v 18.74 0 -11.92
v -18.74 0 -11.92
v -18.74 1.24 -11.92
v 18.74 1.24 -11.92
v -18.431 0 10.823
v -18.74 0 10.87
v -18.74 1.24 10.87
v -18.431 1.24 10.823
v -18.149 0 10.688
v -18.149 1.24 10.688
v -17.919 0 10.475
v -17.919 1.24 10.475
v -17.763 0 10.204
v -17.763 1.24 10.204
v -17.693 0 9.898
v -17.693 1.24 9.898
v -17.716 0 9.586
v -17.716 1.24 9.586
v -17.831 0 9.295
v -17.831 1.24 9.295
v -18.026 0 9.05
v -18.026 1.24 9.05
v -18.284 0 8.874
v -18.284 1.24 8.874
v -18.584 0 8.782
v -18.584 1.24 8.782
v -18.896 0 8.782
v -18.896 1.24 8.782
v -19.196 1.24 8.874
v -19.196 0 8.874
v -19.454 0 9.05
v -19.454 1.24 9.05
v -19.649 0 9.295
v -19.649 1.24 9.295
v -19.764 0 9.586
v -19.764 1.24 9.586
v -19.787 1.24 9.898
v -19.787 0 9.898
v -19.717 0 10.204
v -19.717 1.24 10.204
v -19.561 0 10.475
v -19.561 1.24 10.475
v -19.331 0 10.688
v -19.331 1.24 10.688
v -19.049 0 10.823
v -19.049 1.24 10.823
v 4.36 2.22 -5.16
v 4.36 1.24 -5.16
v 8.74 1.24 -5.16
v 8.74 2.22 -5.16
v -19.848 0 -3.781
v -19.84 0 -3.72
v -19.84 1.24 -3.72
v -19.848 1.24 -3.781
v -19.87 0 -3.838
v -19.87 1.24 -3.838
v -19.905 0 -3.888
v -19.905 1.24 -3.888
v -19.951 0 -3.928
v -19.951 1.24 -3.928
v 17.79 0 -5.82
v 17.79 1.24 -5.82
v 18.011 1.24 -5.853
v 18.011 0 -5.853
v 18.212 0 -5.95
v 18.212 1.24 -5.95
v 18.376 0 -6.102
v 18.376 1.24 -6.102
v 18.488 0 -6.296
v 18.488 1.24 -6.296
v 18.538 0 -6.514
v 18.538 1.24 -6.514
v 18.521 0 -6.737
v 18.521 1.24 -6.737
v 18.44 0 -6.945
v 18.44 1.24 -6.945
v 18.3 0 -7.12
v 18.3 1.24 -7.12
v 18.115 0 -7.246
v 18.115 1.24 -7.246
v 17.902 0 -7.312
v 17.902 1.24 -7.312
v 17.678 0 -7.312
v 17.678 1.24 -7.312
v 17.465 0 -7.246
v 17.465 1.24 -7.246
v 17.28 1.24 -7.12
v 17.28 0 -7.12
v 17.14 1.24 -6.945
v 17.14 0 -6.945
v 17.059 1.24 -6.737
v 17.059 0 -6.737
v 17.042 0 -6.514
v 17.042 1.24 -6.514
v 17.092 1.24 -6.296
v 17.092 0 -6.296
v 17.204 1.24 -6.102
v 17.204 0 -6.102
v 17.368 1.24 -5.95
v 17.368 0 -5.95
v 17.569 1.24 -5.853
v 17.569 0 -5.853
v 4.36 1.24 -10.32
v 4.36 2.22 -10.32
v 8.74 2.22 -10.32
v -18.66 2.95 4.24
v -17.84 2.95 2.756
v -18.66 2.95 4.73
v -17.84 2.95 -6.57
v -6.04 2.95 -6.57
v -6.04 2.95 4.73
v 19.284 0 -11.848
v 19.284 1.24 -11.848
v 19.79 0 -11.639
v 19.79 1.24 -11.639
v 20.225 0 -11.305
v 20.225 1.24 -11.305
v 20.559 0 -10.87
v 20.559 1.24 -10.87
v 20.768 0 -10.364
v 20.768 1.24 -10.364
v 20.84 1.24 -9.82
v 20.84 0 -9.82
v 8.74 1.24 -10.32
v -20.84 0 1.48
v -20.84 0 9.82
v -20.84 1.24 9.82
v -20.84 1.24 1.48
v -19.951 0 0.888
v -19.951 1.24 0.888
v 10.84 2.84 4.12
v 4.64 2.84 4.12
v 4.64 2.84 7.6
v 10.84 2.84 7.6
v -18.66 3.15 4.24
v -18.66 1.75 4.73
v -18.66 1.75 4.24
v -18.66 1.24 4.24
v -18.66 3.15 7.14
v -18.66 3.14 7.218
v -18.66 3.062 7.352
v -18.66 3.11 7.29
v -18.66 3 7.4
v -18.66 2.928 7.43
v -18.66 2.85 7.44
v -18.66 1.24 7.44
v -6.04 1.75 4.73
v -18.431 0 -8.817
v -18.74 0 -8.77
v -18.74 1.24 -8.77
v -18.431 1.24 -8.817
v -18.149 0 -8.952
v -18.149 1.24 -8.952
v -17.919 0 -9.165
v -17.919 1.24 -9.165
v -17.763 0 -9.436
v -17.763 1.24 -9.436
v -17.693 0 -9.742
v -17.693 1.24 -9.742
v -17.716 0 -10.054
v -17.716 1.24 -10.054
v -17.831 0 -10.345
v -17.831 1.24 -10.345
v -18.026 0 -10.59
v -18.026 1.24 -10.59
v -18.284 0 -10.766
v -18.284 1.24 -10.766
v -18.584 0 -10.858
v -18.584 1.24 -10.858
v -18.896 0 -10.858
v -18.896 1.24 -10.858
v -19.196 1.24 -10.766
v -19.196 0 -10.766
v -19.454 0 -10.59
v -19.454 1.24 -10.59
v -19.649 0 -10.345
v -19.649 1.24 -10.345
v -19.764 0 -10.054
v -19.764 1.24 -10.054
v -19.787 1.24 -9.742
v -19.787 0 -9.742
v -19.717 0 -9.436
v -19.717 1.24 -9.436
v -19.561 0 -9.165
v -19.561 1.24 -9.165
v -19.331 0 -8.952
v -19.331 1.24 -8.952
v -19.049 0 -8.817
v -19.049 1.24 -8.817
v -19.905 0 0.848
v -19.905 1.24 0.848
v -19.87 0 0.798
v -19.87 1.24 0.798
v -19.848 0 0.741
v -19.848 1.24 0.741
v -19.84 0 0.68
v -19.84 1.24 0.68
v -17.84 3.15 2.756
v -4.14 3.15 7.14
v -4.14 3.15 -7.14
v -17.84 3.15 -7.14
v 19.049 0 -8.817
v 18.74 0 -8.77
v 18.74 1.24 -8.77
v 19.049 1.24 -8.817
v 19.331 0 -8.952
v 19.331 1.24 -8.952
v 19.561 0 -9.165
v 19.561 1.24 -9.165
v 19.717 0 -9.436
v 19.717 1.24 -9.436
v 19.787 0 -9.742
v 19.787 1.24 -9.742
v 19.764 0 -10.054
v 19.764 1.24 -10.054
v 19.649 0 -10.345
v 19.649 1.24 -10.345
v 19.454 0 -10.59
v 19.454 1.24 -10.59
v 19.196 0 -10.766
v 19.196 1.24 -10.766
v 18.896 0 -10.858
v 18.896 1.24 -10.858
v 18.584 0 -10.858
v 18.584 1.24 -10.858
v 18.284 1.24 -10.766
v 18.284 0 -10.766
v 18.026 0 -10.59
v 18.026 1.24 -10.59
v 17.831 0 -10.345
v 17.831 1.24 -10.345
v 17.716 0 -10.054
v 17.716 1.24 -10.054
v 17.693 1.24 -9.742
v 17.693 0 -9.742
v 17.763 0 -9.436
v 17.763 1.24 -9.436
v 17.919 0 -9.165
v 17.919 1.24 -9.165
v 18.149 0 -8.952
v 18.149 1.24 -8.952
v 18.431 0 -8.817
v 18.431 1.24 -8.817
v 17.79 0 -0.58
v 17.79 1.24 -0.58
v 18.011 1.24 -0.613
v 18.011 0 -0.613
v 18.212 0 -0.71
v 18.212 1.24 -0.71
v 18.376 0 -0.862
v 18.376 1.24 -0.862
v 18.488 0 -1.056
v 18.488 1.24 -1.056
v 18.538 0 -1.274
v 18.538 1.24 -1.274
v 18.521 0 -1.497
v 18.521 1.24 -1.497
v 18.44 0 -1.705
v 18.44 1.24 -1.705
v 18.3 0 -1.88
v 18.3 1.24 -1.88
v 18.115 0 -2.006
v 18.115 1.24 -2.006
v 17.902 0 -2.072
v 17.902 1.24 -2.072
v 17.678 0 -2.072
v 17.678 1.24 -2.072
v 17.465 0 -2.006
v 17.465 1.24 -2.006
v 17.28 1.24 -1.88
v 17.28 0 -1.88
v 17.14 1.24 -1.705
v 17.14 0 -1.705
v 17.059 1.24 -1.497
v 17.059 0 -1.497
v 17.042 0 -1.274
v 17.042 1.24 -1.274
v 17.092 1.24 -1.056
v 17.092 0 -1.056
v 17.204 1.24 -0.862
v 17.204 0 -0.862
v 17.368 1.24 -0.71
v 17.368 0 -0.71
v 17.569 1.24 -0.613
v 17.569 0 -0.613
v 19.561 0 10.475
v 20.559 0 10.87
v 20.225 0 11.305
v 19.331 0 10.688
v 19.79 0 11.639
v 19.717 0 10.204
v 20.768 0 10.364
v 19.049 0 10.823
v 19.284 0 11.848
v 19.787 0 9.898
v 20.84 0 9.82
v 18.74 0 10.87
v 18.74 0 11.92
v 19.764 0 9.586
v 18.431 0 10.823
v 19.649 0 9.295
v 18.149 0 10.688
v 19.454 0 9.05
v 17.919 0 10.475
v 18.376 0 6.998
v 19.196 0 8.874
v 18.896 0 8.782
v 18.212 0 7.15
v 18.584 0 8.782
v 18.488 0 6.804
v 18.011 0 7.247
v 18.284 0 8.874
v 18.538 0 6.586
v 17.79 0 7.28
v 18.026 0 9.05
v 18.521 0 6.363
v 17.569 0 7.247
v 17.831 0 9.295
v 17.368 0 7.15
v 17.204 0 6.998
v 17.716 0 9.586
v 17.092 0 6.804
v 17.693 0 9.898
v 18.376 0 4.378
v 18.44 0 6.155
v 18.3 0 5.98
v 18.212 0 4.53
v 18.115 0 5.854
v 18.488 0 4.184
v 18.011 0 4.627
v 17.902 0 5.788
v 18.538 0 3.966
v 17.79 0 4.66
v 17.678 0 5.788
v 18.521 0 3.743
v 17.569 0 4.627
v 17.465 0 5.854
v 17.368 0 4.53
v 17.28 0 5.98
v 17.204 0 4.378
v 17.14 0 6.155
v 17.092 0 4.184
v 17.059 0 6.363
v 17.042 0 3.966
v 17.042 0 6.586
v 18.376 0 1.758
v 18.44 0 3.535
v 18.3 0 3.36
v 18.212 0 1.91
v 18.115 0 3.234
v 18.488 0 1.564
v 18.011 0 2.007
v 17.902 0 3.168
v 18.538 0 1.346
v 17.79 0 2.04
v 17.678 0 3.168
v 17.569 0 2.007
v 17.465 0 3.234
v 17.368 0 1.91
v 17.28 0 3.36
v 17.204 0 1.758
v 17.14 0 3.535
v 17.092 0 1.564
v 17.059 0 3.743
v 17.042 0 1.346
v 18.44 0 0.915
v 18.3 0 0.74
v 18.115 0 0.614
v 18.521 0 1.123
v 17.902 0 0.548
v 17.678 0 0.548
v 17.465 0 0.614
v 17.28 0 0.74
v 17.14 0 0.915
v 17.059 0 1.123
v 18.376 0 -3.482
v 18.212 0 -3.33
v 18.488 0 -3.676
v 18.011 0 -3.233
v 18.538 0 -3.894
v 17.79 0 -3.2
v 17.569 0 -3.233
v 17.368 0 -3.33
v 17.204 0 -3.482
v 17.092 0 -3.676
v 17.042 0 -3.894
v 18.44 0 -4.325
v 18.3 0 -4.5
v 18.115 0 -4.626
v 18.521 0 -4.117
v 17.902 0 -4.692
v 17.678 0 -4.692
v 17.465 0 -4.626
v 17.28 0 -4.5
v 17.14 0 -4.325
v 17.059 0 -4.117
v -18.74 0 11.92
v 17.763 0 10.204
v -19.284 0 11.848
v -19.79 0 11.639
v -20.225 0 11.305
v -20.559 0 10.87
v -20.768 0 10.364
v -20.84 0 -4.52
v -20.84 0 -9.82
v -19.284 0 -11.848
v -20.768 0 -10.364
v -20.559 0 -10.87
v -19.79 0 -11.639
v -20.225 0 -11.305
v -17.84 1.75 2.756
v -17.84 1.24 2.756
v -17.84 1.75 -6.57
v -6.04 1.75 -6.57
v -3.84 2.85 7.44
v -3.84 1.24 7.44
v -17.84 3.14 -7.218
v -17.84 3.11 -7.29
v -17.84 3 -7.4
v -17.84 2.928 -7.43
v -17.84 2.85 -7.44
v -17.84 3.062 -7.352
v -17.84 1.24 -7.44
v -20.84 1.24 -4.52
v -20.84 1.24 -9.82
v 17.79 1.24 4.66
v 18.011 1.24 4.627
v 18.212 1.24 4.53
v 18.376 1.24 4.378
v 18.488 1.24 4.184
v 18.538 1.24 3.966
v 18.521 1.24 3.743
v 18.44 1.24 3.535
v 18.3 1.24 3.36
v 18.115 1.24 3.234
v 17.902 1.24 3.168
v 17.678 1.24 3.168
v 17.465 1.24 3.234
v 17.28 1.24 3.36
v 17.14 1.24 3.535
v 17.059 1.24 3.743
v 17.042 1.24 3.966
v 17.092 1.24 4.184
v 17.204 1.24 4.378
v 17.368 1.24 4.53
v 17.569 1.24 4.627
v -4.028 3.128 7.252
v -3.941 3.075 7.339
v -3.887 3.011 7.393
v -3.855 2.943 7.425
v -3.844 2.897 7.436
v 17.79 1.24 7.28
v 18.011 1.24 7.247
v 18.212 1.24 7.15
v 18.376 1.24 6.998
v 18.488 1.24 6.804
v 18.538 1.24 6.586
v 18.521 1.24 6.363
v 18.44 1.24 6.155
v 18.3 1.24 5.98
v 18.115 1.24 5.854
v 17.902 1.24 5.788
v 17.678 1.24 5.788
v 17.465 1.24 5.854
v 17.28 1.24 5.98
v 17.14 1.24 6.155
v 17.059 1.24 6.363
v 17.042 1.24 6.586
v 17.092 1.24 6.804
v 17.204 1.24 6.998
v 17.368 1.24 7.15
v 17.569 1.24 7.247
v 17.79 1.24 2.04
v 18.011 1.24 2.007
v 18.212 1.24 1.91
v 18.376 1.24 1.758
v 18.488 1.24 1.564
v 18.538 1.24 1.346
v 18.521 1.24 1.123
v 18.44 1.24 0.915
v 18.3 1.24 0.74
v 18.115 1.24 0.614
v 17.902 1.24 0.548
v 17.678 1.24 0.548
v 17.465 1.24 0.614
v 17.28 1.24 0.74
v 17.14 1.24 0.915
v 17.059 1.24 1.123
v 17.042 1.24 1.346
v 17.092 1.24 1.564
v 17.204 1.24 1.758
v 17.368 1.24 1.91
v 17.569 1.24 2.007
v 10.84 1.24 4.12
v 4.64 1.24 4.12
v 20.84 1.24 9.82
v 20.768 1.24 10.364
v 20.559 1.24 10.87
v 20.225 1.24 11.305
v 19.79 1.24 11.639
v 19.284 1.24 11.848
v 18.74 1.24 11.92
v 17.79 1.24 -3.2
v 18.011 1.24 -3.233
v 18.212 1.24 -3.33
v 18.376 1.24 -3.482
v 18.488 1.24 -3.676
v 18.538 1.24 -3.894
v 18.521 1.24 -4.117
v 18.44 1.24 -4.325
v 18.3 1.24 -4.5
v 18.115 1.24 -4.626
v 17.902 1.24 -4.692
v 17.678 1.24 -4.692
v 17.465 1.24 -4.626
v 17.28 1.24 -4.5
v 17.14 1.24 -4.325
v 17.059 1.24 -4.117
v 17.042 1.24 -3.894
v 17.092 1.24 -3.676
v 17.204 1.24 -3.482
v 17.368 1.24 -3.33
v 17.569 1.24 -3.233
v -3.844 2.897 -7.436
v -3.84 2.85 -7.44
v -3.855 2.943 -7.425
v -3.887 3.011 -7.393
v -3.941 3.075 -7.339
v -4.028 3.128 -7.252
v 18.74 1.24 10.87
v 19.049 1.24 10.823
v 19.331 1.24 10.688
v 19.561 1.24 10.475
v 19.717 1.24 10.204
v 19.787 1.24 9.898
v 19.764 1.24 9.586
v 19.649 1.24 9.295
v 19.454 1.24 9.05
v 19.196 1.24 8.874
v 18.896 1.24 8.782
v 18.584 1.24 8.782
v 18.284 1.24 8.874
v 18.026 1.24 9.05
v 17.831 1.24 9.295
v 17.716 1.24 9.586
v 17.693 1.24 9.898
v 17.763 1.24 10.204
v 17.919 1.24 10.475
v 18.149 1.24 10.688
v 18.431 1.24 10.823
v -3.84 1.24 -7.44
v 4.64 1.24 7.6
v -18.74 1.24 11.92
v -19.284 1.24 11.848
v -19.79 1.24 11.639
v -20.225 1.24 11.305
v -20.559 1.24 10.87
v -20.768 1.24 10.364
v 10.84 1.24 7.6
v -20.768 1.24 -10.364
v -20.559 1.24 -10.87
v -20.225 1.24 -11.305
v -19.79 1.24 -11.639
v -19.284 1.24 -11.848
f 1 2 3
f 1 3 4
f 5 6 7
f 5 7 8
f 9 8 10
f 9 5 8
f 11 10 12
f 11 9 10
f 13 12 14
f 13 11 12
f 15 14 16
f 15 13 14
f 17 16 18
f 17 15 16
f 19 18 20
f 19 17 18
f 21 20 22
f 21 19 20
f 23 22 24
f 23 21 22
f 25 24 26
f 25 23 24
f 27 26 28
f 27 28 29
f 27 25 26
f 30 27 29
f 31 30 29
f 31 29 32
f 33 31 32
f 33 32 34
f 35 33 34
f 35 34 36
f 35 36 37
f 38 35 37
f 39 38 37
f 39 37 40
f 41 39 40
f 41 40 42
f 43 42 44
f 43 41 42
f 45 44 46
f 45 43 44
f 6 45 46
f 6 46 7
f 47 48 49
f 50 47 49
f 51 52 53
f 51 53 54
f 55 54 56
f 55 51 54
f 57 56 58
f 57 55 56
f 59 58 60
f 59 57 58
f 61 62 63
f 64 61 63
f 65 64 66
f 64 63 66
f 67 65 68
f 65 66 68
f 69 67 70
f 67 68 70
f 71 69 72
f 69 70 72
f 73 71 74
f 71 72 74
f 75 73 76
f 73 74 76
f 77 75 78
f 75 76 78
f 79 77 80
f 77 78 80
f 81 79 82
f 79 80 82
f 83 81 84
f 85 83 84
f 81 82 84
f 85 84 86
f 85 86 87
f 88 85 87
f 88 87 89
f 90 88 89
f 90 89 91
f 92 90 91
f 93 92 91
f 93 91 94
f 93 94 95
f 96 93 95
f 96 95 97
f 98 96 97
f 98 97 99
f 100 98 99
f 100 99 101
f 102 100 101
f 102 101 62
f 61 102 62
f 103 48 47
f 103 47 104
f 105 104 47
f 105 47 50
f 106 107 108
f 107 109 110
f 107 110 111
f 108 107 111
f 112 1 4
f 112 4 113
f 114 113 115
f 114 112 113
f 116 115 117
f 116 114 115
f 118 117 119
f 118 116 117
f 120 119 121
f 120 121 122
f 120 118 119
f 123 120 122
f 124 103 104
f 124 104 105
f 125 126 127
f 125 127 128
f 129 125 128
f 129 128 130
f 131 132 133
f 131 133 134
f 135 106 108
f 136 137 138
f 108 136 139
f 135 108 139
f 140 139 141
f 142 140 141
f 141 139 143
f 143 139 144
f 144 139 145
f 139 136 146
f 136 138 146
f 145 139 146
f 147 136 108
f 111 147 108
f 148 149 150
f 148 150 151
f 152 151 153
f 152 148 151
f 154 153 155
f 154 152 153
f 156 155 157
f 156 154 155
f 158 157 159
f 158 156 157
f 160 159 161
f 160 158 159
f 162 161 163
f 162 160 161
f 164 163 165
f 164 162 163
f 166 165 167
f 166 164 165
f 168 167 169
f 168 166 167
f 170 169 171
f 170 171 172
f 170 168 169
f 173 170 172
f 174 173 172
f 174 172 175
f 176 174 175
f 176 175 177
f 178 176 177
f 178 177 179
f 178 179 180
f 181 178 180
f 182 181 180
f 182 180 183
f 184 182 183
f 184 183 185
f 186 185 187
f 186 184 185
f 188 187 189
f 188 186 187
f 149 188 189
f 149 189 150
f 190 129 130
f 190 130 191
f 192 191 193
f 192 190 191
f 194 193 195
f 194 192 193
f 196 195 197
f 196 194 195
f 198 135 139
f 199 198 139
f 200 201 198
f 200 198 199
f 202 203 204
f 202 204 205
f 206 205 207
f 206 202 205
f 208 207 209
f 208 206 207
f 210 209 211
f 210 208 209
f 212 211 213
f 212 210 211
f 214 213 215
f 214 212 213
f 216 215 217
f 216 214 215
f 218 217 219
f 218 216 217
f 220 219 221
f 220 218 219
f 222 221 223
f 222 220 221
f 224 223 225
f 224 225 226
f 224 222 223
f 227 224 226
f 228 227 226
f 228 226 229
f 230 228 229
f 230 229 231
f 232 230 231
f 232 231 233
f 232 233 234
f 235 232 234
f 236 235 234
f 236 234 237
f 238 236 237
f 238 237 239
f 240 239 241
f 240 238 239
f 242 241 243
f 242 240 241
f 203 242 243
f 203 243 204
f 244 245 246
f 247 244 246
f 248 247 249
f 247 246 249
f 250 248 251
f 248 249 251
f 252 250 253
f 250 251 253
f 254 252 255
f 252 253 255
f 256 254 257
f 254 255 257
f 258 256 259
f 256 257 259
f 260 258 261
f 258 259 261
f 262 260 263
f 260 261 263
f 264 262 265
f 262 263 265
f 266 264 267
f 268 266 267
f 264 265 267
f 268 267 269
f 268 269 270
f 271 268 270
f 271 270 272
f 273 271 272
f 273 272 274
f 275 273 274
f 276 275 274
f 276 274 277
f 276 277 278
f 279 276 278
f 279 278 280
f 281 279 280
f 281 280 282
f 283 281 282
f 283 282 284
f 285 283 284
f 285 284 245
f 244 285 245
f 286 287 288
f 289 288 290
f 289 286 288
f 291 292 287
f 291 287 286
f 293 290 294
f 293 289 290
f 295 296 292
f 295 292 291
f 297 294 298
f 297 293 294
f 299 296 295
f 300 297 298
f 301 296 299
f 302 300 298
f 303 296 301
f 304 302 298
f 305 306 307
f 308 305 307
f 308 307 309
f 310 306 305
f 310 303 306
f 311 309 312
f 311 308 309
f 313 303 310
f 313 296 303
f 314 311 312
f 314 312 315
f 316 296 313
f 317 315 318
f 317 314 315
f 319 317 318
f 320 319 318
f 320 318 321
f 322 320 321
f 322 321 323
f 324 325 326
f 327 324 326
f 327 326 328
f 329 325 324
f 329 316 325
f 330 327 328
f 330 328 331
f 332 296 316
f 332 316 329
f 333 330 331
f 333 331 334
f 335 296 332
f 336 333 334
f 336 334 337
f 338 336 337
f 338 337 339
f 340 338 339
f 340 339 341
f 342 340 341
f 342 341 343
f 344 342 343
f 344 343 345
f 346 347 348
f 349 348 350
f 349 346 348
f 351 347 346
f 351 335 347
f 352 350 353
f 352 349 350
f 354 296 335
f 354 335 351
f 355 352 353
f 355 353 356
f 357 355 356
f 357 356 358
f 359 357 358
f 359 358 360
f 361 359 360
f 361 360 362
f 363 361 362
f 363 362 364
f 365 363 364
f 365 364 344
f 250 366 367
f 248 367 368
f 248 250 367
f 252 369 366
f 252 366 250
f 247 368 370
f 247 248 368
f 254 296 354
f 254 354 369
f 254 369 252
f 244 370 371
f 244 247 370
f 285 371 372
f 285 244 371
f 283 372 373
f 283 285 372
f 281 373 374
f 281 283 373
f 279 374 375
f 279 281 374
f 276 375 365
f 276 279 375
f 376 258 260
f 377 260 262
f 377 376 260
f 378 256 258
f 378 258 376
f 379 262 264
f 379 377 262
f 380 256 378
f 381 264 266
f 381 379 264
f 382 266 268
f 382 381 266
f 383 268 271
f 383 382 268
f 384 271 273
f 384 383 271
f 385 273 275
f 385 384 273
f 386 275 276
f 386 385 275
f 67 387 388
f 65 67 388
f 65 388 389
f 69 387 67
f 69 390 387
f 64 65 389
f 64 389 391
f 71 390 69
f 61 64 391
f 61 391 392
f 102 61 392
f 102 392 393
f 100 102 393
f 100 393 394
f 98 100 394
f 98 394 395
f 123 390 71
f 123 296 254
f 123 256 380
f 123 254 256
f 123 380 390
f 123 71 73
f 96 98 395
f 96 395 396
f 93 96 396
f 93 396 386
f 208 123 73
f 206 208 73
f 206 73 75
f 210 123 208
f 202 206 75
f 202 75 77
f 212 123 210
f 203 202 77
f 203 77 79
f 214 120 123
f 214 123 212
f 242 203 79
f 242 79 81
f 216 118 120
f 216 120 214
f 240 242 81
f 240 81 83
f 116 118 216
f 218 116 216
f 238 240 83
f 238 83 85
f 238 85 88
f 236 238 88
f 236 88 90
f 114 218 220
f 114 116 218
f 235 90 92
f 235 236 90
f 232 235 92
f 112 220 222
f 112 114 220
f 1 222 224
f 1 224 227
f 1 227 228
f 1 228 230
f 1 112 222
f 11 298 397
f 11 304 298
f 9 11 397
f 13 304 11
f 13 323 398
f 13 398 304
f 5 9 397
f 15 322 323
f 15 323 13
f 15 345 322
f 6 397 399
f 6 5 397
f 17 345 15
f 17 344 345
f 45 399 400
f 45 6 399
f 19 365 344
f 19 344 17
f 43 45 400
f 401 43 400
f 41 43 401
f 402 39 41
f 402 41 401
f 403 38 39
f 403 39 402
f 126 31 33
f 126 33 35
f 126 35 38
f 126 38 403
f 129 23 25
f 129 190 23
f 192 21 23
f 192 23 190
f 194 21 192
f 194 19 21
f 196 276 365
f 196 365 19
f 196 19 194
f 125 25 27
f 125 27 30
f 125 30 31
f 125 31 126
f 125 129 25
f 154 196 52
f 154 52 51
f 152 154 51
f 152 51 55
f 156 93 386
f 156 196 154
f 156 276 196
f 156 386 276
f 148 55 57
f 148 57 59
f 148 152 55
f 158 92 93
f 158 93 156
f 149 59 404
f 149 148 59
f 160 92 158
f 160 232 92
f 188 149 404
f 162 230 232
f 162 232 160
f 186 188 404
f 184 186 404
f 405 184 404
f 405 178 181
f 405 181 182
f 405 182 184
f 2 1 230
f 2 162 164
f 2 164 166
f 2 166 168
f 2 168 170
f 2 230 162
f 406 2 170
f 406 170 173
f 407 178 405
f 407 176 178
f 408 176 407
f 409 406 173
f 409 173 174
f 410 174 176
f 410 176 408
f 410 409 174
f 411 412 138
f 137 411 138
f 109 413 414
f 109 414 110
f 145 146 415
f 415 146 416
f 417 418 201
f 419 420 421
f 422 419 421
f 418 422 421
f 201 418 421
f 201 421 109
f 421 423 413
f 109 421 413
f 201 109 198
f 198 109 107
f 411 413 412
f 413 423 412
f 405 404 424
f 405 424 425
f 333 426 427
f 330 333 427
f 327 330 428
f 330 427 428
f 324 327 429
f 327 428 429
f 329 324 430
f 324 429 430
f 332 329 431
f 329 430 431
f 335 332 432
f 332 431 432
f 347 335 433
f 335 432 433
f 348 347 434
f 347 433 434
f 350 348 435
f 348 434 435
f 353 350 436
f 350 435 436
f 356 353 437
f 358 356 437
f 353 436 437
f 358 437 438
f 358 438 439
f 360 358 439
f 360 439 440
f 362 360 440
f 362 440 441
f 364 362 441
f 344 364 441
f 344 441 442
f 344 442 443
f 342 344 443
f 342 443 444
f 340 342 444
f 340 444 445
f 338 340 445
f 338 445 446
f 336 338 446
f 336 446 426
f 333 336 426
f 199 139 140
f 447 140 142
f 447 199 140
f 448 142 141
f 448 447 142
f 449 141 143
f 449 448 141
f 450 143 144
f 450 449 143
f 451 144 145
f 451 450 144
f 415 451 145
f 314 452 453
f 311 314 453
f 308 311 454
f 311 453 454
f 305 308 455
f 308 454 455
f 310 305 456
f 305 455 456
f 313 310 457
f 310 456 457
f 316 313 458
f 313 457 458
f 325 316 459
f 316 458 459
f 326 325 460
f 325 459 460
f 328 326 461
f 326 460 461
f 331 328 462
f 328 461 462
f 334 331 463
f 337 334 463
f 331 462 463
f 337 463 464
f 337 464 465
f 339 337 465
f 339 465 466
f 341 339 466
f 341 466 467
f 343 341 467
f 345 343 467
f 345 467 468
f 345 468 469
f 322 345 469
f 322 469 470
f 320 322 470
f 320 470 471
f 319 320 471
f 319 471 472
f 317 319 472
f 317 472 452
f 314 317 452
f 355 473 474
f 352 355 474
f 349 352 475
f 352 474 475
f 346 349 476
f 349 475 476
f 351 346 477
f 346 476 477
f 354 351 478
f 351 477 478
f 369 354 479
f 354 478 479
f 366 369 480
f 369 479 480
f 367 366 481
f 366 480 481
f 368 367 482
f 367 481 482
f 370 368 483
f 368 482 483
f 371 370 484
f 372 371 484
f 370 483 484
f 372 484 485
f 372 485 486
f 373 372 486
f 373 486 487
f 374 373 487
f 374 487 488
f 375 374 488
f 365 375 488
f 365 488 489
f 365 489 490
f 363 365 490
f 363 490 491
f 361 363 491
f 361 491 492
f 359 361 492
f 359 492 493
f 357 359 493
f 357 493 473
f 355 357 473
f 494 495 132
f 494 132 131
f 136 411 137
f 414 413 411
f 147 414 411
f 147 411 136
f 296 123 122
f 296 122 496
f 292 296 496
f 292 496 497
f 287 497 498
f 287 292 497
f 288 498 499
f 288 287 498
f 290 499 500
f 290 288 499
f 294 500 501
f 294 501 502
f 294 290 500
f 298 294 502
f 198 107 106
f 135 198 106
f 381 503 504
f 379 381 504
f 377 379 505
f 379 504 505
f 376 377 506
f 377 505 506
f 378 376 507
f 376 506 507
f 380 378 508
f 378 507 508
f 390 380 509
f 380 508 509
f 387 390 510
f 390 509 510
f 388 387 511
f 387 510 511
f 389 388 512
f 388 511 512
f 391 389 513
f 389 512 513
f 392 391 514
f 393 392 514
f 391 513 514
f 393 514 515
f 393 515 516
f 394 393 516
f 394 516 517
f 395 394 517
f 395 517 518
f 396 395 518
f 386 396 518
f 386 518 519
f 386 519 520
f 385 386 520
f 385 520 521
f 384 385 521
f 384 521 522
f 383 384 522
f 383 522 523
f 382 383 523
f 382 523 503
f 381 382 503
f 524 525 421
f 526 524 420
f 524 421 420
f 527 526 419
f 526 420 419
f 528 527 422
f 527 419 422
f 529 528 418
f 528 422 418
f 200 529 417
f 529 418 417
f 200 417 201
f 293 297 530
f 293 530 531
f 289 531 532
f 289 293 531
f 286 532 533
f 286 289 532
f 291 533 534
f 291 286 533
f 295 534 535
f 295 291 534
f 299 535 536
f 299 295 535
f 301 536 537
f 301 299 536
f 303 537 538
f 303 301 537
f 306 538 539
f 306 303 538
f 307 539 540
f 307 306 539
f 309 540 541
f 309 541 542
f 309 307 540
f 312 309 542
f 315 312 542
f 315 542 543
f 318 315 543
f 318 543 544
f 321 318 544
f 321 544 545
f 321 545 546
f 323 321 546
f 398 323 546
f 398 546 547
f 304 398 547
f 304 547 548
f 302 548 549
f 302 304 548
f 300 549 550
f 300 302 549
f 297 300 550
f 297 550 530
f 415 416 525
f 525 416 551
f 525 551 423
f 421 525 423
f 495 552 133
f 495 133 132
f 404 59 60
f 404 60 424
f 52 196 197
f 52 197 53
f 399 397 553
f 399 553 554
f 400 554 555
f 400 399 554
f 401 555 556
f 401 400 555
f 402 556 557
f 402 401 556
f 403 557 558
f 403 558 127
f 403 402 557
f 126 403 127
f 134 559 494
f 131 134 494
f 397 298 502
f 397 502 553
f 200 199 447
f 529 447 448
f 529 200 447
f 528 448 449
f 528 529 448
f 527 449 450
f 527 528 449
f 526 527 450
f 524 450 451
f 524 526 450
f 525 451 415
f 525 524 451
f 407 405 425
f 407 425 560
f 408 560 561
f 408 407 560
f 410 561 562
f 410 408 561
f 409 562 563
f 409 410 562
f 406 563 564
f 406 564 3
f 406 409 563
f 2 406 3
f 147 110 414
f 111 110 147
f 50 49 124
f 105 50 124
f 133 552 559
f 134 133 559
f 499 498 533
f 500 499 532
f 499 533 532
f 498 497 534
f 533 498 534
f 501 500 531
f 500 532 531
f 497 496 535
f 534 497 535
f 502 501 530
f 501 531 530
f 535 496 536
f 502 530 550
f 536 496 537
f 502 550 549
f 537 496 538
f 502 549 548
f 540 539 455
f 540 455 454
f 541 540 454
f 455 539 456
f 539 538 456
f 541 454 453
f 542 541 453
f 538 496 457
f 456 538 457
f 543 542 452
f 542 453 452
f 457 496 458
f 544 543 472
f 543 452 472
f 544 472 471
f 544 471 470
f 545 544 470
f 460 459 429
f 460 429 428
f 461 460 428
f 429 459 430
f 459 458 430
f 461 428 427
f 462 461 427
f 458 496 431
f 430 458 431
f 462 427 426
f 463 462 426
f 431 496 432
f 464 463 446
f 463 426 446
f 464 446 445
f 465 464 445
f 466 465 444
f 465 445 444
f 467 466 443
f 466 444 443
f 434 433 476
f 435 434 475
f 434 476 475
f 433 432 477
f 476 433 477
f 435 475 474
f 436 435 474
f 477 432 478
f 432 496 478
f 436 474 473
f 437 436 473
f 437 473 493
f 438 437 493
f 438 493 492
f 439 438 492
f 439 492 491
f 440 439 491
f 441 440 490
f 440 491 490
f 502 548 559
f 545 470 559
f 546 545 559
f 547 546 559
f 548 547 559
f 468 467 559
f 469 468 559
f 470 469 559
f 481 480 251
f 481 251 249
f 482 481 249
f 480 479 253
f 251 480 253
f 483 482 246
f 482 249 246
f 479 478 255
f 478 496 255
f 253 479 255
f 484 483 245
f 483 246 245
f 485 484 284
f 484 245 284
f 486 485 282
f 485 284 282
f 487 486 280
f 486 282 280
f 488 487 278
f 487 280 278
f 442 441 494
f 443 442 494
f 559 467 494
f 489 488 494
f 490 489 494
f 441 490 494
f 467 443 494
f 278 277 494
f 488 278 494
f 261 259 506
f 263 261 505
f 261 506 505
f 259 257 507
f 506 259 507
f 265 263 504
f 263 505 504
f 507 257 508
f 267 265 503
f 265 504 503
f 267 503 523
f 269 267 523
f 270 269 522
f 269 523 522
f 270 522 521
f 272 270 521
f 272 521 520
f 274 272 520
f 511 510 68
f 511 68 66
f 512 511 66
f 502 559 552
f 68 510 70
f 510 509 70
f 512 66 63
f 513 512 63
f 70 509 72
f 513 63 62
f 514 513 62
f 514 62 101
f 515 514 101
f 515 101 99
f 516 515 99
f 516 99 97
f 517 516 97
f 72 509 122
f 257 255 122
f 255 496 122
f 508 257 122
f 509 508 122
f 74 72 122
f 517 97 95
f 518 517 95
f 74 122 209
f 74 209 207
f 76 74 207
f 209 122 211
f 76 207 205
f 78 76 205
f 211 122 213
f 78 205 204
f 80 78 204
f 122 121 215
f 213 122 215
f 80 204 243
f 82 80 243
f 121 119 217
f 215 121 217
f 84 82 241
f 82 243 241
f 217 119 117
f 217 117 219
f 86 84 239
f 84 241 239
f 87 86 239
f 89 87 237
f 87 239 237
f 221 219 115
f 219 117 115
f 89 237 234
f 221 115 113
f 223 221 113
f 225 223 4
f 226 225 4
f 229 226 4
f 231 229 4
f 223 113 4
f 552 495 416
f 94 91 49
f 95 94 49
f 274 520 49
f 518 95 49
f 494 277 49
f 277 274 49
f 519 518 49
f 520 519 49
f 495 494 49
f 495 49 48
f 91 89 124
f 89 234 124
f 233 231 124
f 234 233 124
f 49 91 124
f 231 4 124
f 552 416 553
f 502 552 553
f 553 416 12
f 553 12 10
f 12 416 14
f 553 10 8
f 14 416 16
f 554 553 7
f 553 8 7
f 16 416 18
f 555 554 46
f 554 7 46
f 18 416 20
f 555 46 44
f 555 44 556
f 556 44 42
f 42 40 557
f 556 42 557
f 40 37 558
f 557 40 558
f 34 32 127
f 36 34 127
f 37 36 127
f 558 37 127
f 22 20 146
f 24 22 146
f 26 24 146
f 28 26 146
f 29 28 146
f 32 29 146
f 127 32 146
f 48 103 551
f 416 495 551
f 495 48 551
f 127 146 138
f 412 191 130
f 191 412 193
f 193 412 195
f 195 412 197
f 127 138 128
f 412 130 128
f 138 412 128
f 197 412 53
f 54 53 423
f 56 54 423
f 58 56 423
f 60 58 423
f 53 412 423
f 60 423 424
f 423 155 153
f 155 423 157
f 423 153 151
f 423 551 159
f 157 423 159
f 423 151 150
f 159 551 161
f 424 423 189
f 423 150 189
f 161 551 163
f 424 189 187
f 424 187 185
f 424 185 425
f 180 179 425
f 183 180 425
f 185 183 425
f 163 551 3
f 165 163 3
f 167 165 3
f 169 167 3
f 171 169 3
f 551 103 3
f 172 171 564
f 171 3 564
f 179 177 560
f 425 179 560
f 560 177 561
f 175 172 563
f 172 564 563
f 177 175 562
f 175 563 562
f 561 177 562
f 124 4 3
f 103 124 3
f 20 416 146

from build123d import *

# Parameters (mm, degrees)
ESQUISSE1_R                         = 1.05
PLAQUE_DEPTH                        = 1.24
CARTE_SD_DEPTH                      = 1.91
ESQUISSE4_W                         = 6.2
ESQUISSE4_H                         = 3.48
PUCE_DEPTH                          = 1.6
ESQUISSE7_W                         = 4.38
ESQUISSE7_H                         = 5.16
PUCE_2_DEPTH                        = 0.98
ESQUISSE8_R                         = 0.75
ENL_V_MAT_EXTRU_1_DEPTH             = 25.084021674
ESQUISSE9_W                         = 11.3
ESQUISSE9_H                         = 1.2
ENL_V_MAT_EXTRU_3_DEPTH             = 11.8
ENL_V_MAT_EXTRU_3_DIRECTION_2_REACH = 42.597
CONG_1_R                            = 0.3


with BuildPart() as part:
    # Esquisse1 → Plaque (new body)
    with BuildSketch(Plane(origin=(0, 0, 0), x_dir=(1, 0, 0), z_dir=(0, 1, 0))):
        with BuildLine():
            Line((-18.74, 11.92), (18.74, 11.92))
            ThreePointArc((18.74, 11.92), (20.22492424, 11.30492424), (20.84, 9.82))
            Line((20.84, 9.82), (20.84, -9.82))
            ThreePointArc((20.84, -9.82), (20.22492424, -11.30492424), (18.74, -11.92))
            Line((18.74, -11.92), (-18.74, -11.92))
            ThreePointArc((-18.74, -11.92), (-20.22492424, -11.30492424), (-20.84, -9.82))
            Line((-20.84, -9.82), (-20.84, -1.48))
            Line((-20.84, -1.48), (-19.951399946, -0.888062551))
            ThreePointArc((-19.951399946, -0.888062551), (-19.869602616, -0.798004209), (-19.84, -0.68))
            Line((-19.84, -0.68), (-19.84, 3.72))
            ThreePointArc((-19.84, 3.72), (-19.869602616, 3.838004209), (-19.951399946, 3.928062551))
            Line((-19.951399946, 3.928062551), (-20.84, 4.52))
            Line((-20.84, 4.52), (-20.84, 9.82))
            ThreePointArc((-20.84, 9.82), (-20.22492424, 11.30492424), (-18.74, 11.92))
        make_face()
        with Locations(Location((-18.74, 9.82, 0), (0, 0, 270))):
            Circle(ESQUISSE1_R, mode=Mode.SUBTRACT)
        with Locations(Location((18.74, 9.82, 0), (0, 0, 270))):
            Circle(ESQUISSE1_R, mode=Mode.SUBTRACT)
        with Locations(Location((-18.74, -9.82, 0), (0, 0, 270))):
            Circle(ESQUISSE1_R, mode=Mode.SUBTRACT)
        with Locations(Location((18.74, -9.82, 0), (0, 0, 270))):
            Circle(ESQUISSE1_R, mode=Mode.SUBTRACT)
    extrude(amount=PLAQUE_DEPTH)

    # Esquisse2 → Carte SD (add)
    with BuildSketch(Plane(origin=(0, 1.24, 0), x_dir=(1, 0, 0), z_dir=(0, 1, 0))):
        Polygon((-18.66, -7.44), (-3.84, -7.44), (-3.84, 7.44), (-17.84, 7.44), (-17.84, -2.756314418), (-18.66, -4.24), align=None)
    extrude(amount=CARTE_SD_DEPTH)

    # Esquisse4 → Puce (add)
    with BuildSketch(Plane(origin=(0, 1.24, 0), x_dir=(1, 0, 0), z_dir=(0, 1, 0))):
        with Locations((7.74, -5.86)):
            Rectangle(ESQUISSE4_W, ESQUISSE4_H)
    extrude(amount=PUCE_DEPTH)

    # Esquisse7 → Puce 2 (add)
    with BuildSketch(Plane(origin=(0, 1.24, 0), x_dir=(1, 0, 0), z_dir=(0, 1, 0))):
        with Locations((6.55, 7.74)):
            Rectangle(ESQUISSE7_W, ESQUISSE7_H)
    extrude(amount=PUCE_2_DEPTH)

    # Esquisse8 → Enlèv. mat.-Extru.1 (cut, through all)
    with BuildSketch(Plane(origin=(0, 1.24, 0), x_dir=(1, 0, 0), z_dir=(0, 1, 0))):
        with Locations(Location((17.79, 6.57, 0), (0, 0, 270))):
            Circle(ESQUISSE8_R)
        with Locations(Location((17.79, 3.95, 0), (0, 0, 270))):
            Circle(ESQUISSE8_R)
        with Locations(Location((17.79, 1.33, 0), (0, 0, 270))):
            Circle(ESQUISSE8_R)
        with Locations(Location((17.79, -1.29, 0), (0, 0, 270))):
            Circle(ESQUISSE8_R)
        with Locations(Location((17.79, -3.91, 0), (0, 0, 270))):
            Circle(ESQUISSE8_R)
        with Locations(Location((17.79, -6.53, 0), (0, 0, 270))):
            Circle(ESQUISSE8_R)
    extrude(amount=-ENL_V_MAT_EXTRU_1_DEPTH, mode=Mode.SUBTRACT)

    # Esquisse9 → Enlèv. mat.-Extru.3 (cut)
    with BuildSketch(Plane.ZY.offset(17.84)):
        with Locations((-0.92, 2.35)):
            Rectangle(ESQUISSE9_W, ESQUISSE9_H)
    extrude(amount=-ENL_V_MAT_EXTRU_3_DEPTH, mode=Mode.SUBTRACT)

    # Enlèv. mat.-Extru.3 direction 2: up to this face of the body (flat: up to its plane)
    enl_v_mat_extru_3_direction_2_end = Plane(part.part.faces().sort_by_distance((-18.66, 2.195, 5.84))[0])
    # Esquisse9 → Enlèv. mat.-Extru.3 direction 2 (cut, up to the picked face)
    with BuildSketch(Plane.ZY.offset(17.84), mode=Mode.PRIVATE) as enl_v_mat_extru_3_direction_2_sk1:
        with Locations((-0.92, 2.35)):
            Rectangle(ESQUISSE9_W, ESQUISSE9_H)
    enl_v_mat_extru_3_direction_2_tool1 = split(extrude(enl_v_mat_extru_3_direction_2_sk1.sketch, amount=ENL_V_MAT_EXTRU_3_DIRECTION_2_REACH, mode=Mode.PRIVATE), bisect_by=enl_v_mat_extru_3_direction_2_end, keep=Keep.BOTH, mode=Mode.PRIVATE)
    add(enl_v_mat_extru_3_direction_2_tool1.solids().sort_by(Axis((-17.84, 2.35, -0.92), (-1, 0, 0)))[0], mode=Mode.SUBTRACT)

    # Congé1
    cong_1_edges = [part.edges().sort_by_distance(p)[0] for p in [
        (-11.25, 3.15, 7.44),
        (-3.84, 3.15, 0),
        (-10.84, 3.15, -7.44),
    ]]
    fillet(cong_1_edges, radius=CONG_1_R)


solid = part.part
